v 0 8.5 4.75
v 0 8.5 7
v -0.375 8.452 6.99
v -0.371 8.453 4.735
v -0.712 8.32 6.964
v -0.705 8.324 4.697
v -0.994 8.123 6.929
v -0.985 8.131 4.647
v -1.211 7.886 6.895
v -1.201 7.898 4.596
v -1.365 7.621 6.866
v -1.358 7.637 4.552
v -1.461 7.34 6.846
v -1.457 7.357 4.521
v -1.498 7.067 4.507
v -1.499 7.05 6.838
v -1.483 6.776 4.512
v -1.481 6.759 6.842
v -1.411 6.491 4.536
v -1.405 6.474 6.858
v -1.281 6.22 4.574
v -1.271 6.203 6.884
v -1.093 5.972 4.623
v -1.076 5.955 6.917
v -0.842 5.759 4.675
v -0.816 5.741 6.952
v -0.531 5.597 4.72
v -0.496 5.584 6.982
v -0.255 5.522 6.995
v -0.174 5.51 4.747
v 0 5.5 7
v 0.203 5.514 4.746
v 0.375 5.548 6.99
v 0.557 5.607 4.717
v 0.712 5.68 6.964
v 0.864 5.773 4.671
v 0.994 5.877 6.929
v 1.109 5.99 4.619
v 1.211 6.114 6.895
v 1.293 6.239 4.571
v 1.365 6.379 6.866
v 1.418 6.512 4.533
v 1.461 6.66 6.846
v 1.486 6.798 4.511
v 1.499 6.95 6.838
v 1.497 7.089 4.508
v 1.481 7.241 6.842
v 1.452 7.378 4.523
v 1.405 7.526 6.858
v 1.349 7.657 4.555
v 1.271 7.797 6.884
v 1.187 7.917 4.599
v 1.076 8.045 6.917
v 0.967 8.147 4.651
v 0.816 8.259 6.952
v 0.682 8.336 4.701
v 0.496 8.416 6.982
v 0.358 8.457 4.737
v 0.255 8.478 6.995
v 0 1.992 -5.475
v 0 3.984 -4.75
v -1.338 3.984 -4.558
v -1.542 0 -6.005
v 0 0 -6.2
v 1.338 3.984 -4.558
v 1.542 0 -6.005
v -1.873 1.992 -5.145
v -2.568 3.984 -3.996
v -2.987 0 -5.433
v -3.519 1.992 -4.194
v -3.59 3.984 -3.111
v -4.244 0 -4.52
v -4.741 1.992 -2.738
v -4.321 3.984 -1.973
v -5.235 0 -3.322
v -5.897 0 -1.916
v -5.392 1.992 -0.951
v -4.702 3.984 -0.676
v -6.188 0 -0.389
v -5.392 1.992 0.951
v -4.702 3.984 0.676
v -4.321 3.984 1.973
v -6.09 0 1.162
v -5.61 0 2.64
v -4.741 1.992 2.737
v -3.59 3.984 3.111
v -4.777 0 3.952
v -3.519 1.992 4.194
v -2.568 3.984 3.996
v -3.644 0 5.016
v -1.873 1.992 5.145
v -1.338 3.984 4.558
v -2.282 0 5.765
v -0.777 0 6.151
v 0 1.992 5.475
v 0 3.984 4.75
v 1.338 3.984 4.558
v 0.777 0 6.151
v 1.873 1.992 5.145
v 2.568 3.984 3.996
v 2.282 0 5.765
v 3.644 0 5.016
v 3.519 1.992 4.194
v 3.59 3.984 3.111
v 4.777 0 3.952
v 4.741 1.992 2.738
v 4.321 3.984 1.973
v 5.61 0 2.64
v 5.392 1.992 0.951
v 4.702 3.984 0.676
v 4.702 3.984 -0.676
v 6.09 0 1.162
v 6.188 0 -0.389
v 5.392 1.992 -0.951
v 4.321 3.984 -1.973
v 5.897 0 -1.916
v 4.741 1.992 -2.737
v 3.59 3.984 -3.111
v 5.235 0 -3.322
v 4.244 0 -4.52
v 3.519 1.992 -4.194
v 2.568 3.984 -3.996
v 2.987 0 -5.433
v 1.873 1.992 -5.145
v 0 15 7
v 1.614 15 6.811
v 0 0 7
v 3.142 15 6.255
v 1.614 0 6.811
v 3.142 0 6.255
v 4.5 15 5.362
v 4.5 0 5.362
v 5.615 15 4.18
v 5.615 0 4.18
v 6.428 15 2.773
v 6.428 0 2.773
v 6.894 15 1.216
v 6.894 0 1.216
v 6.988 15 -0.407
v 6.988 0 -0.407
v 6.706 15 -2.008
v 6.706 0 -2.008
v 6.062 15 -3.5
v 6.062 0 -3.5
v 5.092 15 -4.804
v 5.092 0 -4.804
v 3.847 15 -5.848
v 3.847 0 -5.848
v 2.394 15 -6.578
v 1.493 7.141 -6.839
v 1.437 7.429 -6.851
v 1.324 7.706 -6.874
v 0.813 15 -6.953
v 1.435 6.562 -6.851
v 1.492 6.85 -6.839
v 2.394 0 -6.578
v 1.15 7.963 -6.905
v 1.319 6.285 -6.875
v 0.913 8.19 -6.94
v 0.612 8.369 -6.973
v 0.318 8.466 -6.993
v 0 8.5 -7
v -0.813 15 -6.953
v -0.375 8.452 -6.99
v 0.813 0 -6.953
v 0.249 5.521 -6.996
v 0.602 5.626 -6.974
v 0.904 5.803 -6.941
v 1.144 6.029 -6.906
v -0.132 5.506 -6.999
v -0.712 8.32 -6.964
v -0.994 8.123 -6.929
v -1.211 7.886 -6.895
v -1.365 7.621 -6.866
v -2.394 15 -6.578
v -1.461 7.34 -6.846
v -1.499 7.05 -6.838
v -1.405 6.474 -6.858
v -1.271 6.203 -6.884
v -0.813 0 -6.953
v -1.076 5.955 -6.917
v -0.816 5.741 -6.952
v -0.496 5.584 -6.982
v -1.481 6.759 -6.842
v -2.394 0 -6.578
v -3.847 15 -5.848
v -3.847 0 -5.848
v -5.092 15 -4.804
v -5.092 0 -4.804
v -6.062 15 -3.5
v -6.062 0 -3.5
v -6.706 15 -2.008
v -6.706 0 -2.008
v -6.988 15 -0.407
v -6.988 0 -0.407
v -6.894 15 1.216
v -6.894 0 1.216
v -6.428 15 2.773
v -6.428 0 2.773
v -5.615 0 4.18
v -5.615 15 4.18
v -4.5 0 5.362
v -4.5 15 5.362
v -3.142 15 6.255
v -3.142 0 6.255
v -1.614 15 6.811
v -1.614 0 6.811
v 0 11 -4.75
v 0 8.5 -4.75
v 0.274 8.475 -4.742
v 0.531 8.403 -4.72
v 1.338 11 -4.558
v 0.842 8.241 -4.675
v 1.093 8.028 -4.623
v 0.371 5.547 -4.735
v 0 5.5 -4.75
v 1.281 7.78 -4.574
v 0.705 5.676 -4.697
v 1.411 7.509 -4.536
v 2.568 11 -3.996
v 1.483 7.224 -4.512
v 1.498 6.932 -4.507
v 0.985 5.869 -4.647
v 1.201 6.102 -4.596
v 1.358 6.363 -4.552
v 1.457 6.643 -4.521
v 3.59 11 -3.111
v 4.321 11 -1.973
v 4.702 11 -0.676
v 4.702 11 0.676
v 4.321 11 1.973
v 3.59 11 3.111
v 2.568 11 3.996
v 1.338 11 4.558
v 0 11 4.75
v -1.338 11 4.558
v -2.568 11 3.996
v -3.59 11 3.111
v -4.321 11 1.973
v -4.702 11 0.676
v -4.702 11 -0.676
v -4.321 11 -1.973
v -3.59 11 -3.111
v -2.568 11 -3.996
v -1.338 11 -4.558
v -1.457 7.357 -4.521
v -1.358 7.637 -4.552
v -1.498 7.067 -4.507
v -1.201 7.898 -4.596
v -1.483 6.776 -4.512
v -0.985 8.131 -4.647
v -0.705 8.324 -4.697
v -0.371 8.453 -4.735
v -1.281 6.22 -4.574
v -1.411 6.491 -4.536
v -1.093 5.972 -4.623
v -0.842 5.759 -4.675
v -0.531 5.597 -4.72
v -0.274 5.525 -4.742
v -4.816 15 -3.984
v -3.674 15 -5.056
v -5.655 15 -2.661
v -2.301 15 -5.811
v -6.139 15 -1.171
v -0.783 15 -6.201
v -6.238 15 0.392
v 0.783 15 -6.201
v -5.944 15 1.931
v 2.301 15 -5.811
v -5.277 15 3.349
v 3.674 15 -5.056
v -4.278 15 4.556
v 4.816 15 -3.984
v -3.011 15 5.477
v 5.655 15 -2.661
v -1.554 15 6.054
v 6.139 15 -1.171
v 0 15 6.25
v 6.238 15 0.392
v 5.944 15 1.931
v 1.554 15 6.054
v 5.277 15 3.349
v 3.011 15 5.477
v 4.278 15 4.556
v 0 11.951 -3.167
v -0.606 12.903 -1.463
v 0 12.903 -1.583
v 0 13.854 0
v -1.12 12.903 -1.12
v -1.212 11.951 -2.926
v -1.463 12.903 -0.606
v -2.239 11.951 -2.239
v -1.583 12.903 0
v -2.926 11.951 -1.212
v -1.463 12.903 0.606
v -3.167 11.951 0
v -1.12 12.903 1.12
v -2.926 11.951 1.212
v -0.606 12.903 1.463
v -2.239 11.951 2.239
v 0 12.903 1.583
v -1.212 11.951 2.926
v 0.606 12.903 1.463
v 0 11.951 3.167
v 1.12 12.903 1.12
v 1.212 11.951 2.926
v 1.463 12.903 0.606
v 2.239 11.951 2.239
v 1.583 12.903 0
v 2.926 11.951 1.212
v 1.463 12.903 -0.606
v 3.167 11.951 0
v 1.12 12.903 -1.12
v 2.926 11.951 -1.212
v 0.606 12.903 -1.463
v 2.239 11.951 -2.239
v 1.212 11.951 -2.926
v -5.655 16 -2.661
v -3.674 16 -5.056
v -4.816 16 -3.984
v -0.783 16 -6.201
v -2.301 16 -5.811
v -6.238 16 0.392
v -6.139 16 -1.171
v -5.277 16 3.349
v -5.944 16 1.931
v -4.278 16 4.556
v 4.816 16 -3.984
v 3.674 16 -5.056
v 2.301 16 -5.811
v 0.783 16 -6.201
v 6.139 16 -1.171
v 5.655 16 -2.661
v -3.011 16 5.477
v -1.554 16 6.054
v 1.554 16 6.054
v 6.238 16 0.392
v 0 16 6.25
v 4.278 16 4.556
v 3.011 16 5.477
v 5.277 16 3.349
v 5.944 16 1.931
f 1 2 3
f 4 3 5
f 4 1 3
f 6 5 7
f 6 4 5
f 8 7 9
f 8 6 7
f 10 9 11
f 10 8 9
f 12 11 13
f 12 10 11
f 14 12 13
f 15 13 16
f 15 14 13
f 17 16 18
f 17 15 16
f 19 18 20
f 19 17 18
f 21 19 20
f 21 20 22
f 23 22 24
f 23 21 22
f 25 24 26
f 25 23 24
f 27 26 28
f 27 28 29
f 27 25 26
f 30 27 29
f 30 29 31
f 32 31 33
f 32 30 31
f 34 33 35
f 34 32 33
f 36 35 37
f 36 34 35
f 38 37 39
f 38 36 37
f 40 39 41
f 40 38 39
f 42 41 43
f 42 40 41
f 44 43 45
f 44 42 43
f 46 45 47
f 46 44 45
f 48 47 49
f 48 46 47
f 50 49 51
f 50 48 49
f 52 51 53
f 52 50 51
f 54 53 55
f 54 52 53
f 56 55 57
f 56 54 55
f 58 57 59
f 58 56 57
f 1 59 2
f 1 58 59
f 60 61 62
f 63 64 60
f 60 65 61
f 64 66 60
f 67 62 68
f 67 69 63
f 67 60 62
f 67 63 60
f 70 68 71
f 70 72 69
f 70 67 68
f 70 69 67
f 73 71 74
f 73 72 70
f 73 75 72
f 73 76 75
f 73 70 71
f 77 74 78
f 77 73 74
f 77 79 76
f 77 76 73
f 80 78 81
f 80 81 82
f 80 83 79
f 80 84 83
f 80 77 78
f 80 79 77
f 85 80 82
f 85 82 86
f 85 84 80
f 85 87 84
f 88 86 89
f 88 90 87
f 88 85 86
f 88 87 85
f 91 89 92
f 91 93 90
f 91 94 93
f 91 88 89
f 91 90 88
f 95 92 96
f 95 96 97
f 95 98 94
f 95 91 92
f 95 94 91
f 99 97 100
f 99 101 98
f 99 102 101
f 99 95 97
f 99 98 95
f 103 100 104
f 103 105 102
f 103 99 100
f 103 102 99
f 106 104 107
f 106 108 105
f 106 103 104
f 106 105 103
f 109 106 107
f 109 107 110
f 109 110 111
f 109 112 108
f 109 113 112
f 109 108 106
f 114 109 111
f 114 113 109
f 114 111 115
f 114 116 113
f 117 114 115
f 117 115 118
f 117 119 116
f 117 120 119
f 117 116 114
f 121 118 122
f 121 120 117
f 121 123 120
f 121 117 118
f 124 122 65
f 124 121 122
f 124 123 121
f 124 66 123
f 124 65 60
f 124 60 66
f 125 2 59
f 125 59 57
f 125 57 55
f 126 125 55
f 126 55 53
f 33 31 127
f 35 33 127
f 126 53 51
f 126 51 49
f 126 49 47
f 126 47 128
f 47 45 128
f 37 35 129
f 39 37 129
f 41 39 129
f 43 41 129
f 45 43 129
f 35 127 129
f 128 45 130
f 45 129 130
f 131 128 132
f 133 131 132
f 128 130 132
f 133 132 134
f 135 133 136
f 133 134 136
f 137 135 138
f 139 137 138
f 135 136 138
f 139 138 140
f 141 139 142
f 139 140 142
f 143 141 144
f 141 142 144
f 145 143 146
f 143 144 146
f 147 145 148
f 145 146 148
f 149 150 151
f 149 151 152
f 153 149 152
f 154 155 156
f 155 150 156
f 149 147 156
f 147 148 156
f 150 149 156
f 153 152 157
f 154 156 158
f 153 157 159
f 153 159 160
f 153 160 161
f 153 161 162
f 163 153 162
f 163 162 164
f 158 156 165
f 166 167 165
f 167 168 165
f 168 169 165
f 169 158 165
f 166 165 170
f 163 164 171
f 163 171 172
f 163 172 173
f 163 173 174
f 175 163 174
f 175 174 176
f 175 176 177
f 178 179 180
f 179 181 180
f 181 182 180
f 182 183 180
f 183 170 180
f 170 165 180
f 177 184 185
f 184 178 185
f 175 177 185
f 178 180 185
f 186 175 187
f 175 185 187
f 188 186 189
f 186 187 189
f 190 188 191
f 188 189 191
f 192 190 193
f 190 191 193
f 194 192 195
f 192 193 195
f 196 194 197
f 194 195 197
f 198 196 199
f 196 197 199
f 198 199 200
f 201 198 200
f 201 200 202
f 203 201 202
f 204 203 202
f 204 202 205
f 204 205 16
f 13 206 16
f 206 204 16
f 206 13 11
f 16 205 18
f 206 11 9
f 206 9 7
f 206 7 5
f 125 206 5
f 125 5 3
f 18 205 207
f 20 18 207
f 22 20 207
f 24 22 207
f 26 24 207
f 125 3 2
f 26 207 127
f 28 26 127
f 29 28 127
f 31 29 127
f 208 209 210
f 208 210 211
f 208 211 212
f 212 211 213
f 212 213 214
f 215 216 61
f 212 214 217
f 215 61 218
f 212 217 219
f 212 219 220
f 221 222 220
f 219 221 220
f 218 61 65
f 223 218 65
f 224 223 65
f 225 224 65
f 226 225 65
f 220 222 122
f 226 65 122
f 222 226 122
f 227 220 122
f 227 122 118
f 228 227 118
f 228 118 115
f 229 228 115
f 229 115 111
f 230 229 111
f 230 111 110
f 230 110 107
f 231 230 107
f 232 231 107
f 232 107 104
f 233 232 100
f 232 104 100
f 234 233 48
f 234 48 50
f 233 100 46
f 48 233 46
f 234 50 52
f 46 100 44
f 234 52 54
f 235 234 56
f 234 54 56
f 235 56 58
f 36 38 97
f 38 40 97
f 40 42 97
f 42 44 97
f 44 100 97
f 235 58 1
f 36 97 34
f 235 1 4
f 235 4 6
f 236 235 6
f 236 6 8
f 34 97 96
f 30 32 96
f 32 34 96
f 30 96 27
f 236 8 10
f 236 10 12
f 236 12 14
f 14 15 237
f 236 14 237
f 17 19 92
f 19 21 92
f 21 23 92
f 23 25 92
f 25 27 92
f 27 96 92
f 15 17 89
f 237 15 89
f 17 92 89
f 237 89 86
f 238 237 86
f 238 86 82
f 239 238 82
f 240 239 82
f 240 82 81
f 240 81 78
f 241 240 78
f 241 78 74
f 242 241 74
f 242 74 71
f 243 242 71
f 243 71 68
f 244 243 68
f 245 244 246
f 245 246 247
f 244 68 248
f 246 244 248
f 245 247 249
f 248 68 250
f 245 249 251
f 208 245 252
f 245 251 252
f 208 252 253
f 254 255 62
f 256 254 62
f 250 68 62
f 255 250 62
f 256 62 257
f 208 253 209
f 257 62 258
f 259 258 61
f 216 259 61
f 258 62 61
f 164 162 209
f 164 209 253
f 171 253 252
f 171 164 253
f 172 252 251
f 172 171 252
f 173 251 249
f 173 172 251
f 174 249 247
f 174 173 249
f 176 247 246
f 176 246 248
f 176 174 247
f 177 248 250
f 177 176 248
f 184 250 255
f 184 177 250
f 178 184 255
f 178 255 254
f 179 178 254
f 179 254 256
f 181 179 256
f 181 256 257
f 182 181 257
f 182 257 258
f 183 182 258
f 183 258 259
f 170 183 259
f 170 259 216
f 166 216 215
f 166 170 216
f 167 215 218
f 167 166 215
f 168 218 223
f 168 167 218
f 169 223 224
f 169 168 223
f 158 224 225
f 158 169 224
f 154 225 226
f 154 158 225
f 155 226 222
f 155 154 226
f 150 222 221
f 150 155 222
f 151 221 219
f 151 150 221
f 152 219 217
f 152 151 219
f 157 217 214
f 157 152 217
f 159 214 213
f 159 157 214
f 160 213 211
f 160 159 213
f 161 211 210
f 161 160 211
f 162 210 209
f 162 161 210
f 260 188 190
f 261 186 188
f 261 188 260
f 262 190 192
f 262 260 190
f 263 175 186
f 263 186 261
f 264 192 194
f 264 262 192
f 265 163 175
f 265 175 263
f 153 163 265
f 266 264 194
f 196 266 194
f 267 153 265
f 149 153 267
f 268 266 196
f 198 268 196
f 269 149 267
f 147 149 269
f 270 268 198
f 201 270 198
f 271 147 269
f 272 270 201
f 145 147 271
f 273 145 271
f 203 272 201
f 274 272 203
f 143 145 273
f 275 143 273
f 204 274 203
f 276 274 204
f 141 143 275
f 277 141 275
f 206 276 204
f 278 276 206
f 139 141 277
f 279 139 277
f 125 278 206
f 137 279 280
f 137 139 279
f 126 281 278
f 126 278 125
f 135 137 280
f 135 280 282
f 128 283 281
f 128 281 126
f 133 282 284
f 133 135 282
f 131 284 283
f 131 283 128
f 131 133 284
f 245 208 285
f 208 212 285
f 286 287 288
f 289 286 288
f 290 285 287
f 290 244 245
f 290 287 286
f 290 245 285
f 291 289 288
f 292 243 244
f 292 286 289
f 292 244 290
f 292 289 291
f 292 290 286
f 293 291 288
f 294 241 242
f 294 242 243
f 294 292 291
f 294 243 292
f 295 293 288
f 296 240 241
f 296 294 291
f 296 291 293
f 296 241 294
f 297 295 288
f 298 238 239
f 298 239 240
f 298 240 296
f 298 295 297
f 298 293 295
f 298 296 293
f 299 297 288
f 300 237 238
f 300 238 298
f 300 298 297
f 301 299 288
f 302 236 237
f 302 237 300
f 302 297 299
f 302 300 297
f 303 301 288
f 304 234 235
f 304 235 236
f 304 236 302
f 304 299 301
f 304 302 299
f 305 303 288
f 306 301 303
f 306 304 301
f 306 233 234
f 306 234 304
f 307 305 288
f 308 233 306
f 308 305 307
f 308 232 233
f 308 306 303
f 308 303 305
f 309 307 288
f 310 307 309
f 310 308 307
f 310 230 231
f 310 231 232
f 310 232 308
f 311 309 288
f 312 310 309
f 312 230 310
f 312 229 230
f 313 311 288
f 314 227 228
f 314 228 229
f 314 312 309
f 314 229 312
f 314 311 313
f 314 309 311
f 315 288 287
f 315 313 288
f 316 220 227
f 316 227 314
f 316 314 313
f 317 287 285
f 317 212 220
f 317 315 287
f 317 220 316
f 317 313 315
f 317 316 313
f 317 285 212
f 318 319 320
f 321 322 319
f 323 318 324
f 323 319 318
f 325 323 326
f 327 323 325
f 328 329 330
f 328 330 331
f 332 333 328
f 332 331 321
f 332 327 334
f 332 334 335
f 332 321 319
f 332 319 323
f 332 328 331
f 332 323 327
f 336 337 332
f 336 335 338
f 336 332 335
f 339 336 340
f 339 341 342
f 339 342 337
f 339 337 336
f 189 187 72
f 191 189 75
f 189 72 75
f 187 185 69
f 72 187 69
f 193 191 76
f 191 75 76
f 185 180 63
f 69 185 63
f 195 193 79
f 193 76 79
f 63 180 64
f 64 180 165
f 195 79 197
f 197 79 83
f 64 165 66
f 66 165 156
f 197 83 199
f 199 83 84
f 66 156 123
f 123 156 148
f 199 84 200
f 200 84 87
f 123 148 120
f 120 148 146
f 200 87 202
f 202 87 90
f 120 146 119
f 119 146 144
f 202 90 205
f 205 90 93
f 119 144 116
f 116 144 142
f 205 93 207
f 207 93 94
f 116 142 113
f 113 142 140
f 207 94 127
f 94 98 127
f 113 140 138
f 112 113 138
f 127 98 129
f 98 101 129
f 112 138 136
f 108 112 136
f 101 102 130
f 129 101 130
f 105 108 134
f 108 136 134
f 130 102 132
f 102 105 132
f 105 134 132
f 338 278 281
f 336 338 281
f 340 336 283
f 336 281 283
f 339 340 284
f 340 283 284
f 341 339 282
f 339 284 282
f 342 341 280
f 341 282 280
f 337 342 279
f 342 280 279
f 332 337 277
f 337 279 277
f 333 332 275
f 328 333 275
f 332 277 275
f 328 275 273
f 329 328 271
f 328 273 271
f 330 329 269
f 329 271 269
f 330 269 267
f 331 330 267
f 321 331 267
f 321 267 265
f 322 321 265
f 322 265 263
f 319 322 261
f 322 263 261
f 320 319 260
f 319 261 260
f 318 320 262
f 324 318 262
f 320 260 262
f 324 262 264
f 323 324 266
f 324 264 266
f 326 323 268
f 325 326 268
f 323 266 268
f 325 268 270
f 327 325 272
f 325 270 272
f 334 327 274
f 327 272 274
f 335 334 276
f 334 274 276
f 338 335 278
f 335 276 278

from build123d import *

# Parameters (mm, degrees)
SKETCH1_R               = 7
BOSS_EXTRUDE1_DEPTH     = 16
CUT_EXTRUDE1_DEPTH      = 19.814887722
CUT_EXTRUDE1_DEPTH_BACK = 19.814887722
SKETCH2_R               = 1.5
SKETCH3_R               = 4.75
CUT_EXTRUDE2_DEPTH      = 11
CUT_EXTRUDE3_START      = -1
SKETCH6_R               = 7
SKETCH6_R_2             = 6.25
CUT_EXTRUDE3_DEPTH      = 1


with BuildPart() as part:
    # Sketch1 → Boss-Extrude1 (new body)
    with BuildSketch(Plane(origin=(0, 0, 0), x_dir=(1, 0, 0), z_dir=(0, 1, 0))):
        with Locations(Location((0, 0, 0), (0, 0, 270))):
            Circle(SKETCH1_R)
    extrude(amount=BOSS_EXTRUDE1_DEPTH)

    # Sketch2 → Cut-Extrude1 (cut, two sides: drawn at the far end of the back side and taken through both)
    with BuildSketch(Plane.XY.offset(-CUT_EXTRUDE1_DEPTH_BACK)):
        with Locations(Location((0, 7, 0), (0, 0, 90.000000049))):
            Circle(SKETCH2_R)
    extrude(amount=CUT_EXTRUDE1_DEPTH + CUT_EXTRUDE1_DEPTH_BACK, mode=Mode.SUBTRACT)

    # Sketch3 → Cut-Extrude2 (cut)
    with BuildSketch(Plane.XZ):
        with Locations(Location((0, 0, 0), (0, 0, 270))):
            Circle(SKETCH3_R)
    extrude(amount=-CUT_EXTRUDE2_DEPTH, mode=Mode.SUBTRACT)

    # Sketch4 → Cut-Revolve1 (revolve, cut)
    with BuildSketch(Plane.XY, mode=Mode.PRIVATE) as cut_revolve1_sk:
        Polygon((0, 11), (0, 13.85408794), (4.75, 11), align=None)
    revolve(cut_revolve1_sk.sketch.rotate(Axis((0, 11, 0), (0, 1, 0)), 90), axis=Axis((0, 11, 0), (0, 1, 0)), mode=Mode.SUBTRACT)

    # Sketch5 → Cut-Revolve2 (revolve, cut)
    with BuildSketch(Plane.XY, mode=Mode.PRIVATE) as cut_revolve2_sk:
        Polygon((4.75, 0), (4.75, 3.983842258), (6.2, 0), align=None)
    revolve(cut_revolve2_sk.sketch.rotate(Axis((0, 0, 0), (0, 1, 0)), 90), axis=Axis((0, 0, 0), (0, 1, 0)), mode=Mode.SUBTRACT)

    # Sketch6 → Cut-Extrude3 (cut)
    with BuildSketch(Plane(origin=(0, 16, 0), x_dir=(1, 0, 0), z_dir=(0, 1, 0)).offset(CUT_EXTRUDE3_START)):
        with Locations(Location((0, 0, 0), (0, 0, 270))):
            Circle(SKETCH6_R)
        with Locations(Location((0, 0, 0), (0, 0, 270))):
            Circle(SKETCH6_R_2, mode=Mode.SUBTRACT)
    extrude(amount=CUT_EXTRUDE3_DEPTH, mode=Mode.SUBTRACT)


solid = part.part
